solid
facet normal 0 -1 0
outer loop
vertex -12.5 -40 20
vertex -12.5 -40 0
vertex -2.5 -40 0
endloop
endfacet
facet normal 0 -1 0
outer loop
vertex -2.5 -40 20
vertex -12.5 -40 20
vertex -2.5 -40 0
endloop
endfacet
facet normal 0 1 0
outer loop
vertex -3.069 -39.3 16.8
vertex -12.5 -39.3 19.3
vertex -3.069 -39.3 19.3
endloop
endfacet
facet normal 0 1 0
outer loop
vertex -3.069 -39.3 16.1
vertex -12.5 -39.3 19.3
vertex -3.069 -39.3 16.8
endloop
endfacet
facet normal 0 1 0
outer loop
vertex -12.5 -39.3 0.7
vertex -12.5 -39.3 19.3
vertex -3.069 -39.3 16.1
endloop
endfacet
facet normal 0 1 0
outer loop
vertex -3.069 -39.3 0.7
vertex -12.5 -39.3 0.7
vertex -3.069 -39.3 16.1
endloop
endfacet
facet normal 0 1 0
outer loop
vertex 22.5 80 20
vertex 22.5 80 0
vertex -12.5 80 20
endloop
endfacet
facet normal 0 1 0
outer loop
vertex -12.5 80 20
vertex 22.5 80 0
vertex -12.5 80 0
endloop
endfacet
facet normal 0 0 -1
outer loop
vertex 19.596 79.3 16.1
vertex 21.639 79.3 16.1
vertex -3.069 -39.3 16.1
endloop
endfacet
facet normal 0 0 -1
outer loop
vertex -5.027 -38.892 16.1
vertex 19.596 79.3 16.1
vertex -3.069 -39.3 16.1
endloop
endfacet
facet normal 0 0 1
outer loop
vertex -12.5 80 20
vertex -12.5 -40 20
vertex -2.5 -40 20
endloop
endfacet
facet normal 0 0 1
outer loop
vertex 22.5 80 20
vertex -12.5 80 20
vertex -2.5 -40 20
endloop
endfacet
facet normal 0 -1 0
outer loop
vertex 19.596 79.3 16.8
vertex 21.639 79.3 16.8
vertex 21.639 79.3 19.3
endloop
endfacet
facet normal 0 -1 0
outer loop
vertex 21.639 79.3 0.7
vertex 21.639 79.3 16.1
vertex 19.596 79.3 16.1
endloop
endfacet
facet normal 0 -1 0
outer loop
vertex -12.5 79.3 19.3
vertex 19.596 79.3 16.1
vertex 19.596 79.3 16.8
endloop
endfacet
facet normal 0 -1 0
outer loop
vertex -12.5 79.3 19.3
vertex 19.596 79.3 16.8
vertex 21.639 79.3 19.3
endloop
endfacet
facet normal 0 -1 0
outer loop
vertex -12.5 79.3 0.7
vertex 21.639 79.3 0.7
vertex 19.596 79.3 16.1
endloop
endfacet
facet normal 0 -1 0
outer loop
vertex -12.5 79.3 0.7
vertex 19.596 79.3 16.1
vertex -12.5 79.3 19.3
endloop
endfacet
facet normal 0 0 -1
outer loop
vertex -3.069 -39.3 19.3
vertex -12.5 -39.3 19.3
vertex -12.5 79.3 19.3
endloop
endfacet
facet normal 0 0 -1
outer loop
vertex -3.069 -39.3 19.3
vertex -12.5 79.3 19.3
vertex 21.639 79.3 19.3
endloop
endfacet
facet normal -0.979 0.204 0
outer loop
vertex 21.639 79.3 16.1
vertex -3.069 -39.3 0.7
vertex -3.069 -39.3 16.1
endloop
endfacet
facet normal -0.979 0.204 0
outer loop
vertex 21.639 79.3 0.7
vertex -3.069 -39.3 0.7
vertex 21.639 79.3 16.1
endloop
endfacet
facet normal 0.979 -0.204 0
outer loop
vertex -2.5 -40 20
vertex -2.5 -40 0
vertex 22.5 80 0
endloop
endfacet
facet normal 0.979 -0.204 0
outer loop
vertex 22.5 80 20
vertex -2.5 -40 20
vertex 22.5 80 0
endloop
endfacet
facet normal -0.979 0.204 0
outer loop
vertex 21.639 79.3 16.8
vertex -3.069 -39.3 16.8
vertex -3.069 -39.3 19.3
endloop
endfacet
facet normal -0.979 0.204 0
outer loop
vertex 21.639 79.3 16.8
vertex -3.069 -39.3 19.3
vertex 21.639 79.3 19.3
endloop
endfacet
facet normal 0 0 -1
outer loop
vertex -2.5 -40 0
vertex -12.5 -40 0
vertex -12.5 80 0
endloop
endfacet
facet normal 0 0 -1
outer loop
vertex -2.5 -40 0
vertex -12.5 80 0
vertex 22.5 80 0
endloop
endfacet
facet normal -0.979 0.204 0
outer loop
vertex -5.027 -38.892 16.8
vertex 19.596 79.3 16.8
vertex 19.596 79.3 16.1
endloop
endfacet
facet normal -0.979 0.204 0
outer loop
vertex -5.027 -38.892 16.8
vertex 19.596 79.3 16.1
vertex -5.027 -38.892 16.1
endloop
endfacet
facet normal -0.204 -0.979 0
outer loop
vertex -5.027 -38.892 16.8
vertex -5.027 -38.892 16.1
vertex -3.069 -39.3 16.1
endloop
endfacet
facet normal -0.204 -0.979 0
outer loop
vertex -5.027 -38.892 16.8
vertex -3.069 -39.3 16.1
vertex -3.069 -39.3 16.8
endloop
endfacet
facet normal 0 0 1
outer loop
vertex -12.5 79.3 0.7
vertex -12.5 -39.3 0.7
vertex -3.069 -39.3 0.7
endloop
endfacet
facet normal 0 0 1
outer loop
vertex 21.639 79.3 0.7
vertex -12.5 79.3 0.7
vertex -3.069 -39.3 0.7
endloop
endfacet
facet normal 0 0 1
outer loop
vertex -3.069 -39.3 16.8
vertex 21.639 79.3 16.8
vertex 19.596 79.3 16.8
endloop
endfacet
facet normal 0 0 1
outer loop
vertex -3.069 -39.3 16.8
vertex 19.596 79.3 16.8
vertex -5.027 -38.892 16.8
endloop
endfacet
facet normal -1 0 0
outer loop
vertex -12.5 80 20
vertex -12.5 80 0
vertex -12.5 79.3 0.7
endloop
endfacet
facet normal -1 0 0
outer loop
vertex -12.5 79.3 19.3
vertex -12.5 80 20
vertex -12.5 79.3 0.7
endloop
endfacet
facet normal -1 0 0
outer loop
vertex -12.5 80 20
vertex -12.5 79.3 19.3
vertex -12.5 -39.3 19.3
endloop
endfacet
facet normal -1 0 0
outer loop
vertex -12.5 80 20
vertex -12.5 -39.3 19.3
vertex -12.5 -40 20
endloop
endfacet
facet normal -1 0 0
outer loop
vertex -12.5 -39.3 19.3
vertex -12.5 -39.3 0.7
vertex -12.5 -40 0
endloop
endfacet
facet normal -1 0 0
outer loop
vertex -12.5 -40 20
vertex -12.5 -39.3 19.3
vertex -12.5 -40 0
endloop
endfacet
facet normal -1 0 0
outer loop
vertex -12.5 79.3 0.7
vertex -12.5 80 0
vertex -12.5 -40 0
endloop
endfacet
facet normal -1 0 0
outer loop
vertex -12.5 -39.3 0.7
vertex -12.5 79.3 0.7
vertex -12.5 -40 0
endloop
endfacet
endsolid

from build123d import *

# Parameters (mm, degrees)
F1_DEPTH = 20
F2_T     = -0.7
F3_W     = 121.1464474762
F3_H     = 0.7
F4_DEPTH = 2


with BuildPart() as f1:
    # F0 (on Top) → F1 (new body)
    with BuildSketch(Plane.XY):
        Polygon((22.5, 80), (-12.5, 80), (-12.5, -40), (-2.5, -40), align=None)
    extrude(amount=F1_DEPTH)

    # F2
    f2_openings = [f1.faces().sort_by_distance(p)[0] for p in [
        (-12.5, 20, 10),
    ]]
    offset(amount=F2_T, openings=f2_openings)

    # F3 (on face) → F4 (join)
    with BuildSketch(Plane(origin=(4.9053959025, -1.0219574797, 0), x_dir=(-0.2039542541, -0.9789804197, 0), z_dir=(-0.9789804197, 0.2039542541, 0))):
        with Locations((-21.4733176025, 16.45)):
            Rectangle(F3_W, F3_H)
    extrude(amount=F4_DEPTH)


solid = f1.part
